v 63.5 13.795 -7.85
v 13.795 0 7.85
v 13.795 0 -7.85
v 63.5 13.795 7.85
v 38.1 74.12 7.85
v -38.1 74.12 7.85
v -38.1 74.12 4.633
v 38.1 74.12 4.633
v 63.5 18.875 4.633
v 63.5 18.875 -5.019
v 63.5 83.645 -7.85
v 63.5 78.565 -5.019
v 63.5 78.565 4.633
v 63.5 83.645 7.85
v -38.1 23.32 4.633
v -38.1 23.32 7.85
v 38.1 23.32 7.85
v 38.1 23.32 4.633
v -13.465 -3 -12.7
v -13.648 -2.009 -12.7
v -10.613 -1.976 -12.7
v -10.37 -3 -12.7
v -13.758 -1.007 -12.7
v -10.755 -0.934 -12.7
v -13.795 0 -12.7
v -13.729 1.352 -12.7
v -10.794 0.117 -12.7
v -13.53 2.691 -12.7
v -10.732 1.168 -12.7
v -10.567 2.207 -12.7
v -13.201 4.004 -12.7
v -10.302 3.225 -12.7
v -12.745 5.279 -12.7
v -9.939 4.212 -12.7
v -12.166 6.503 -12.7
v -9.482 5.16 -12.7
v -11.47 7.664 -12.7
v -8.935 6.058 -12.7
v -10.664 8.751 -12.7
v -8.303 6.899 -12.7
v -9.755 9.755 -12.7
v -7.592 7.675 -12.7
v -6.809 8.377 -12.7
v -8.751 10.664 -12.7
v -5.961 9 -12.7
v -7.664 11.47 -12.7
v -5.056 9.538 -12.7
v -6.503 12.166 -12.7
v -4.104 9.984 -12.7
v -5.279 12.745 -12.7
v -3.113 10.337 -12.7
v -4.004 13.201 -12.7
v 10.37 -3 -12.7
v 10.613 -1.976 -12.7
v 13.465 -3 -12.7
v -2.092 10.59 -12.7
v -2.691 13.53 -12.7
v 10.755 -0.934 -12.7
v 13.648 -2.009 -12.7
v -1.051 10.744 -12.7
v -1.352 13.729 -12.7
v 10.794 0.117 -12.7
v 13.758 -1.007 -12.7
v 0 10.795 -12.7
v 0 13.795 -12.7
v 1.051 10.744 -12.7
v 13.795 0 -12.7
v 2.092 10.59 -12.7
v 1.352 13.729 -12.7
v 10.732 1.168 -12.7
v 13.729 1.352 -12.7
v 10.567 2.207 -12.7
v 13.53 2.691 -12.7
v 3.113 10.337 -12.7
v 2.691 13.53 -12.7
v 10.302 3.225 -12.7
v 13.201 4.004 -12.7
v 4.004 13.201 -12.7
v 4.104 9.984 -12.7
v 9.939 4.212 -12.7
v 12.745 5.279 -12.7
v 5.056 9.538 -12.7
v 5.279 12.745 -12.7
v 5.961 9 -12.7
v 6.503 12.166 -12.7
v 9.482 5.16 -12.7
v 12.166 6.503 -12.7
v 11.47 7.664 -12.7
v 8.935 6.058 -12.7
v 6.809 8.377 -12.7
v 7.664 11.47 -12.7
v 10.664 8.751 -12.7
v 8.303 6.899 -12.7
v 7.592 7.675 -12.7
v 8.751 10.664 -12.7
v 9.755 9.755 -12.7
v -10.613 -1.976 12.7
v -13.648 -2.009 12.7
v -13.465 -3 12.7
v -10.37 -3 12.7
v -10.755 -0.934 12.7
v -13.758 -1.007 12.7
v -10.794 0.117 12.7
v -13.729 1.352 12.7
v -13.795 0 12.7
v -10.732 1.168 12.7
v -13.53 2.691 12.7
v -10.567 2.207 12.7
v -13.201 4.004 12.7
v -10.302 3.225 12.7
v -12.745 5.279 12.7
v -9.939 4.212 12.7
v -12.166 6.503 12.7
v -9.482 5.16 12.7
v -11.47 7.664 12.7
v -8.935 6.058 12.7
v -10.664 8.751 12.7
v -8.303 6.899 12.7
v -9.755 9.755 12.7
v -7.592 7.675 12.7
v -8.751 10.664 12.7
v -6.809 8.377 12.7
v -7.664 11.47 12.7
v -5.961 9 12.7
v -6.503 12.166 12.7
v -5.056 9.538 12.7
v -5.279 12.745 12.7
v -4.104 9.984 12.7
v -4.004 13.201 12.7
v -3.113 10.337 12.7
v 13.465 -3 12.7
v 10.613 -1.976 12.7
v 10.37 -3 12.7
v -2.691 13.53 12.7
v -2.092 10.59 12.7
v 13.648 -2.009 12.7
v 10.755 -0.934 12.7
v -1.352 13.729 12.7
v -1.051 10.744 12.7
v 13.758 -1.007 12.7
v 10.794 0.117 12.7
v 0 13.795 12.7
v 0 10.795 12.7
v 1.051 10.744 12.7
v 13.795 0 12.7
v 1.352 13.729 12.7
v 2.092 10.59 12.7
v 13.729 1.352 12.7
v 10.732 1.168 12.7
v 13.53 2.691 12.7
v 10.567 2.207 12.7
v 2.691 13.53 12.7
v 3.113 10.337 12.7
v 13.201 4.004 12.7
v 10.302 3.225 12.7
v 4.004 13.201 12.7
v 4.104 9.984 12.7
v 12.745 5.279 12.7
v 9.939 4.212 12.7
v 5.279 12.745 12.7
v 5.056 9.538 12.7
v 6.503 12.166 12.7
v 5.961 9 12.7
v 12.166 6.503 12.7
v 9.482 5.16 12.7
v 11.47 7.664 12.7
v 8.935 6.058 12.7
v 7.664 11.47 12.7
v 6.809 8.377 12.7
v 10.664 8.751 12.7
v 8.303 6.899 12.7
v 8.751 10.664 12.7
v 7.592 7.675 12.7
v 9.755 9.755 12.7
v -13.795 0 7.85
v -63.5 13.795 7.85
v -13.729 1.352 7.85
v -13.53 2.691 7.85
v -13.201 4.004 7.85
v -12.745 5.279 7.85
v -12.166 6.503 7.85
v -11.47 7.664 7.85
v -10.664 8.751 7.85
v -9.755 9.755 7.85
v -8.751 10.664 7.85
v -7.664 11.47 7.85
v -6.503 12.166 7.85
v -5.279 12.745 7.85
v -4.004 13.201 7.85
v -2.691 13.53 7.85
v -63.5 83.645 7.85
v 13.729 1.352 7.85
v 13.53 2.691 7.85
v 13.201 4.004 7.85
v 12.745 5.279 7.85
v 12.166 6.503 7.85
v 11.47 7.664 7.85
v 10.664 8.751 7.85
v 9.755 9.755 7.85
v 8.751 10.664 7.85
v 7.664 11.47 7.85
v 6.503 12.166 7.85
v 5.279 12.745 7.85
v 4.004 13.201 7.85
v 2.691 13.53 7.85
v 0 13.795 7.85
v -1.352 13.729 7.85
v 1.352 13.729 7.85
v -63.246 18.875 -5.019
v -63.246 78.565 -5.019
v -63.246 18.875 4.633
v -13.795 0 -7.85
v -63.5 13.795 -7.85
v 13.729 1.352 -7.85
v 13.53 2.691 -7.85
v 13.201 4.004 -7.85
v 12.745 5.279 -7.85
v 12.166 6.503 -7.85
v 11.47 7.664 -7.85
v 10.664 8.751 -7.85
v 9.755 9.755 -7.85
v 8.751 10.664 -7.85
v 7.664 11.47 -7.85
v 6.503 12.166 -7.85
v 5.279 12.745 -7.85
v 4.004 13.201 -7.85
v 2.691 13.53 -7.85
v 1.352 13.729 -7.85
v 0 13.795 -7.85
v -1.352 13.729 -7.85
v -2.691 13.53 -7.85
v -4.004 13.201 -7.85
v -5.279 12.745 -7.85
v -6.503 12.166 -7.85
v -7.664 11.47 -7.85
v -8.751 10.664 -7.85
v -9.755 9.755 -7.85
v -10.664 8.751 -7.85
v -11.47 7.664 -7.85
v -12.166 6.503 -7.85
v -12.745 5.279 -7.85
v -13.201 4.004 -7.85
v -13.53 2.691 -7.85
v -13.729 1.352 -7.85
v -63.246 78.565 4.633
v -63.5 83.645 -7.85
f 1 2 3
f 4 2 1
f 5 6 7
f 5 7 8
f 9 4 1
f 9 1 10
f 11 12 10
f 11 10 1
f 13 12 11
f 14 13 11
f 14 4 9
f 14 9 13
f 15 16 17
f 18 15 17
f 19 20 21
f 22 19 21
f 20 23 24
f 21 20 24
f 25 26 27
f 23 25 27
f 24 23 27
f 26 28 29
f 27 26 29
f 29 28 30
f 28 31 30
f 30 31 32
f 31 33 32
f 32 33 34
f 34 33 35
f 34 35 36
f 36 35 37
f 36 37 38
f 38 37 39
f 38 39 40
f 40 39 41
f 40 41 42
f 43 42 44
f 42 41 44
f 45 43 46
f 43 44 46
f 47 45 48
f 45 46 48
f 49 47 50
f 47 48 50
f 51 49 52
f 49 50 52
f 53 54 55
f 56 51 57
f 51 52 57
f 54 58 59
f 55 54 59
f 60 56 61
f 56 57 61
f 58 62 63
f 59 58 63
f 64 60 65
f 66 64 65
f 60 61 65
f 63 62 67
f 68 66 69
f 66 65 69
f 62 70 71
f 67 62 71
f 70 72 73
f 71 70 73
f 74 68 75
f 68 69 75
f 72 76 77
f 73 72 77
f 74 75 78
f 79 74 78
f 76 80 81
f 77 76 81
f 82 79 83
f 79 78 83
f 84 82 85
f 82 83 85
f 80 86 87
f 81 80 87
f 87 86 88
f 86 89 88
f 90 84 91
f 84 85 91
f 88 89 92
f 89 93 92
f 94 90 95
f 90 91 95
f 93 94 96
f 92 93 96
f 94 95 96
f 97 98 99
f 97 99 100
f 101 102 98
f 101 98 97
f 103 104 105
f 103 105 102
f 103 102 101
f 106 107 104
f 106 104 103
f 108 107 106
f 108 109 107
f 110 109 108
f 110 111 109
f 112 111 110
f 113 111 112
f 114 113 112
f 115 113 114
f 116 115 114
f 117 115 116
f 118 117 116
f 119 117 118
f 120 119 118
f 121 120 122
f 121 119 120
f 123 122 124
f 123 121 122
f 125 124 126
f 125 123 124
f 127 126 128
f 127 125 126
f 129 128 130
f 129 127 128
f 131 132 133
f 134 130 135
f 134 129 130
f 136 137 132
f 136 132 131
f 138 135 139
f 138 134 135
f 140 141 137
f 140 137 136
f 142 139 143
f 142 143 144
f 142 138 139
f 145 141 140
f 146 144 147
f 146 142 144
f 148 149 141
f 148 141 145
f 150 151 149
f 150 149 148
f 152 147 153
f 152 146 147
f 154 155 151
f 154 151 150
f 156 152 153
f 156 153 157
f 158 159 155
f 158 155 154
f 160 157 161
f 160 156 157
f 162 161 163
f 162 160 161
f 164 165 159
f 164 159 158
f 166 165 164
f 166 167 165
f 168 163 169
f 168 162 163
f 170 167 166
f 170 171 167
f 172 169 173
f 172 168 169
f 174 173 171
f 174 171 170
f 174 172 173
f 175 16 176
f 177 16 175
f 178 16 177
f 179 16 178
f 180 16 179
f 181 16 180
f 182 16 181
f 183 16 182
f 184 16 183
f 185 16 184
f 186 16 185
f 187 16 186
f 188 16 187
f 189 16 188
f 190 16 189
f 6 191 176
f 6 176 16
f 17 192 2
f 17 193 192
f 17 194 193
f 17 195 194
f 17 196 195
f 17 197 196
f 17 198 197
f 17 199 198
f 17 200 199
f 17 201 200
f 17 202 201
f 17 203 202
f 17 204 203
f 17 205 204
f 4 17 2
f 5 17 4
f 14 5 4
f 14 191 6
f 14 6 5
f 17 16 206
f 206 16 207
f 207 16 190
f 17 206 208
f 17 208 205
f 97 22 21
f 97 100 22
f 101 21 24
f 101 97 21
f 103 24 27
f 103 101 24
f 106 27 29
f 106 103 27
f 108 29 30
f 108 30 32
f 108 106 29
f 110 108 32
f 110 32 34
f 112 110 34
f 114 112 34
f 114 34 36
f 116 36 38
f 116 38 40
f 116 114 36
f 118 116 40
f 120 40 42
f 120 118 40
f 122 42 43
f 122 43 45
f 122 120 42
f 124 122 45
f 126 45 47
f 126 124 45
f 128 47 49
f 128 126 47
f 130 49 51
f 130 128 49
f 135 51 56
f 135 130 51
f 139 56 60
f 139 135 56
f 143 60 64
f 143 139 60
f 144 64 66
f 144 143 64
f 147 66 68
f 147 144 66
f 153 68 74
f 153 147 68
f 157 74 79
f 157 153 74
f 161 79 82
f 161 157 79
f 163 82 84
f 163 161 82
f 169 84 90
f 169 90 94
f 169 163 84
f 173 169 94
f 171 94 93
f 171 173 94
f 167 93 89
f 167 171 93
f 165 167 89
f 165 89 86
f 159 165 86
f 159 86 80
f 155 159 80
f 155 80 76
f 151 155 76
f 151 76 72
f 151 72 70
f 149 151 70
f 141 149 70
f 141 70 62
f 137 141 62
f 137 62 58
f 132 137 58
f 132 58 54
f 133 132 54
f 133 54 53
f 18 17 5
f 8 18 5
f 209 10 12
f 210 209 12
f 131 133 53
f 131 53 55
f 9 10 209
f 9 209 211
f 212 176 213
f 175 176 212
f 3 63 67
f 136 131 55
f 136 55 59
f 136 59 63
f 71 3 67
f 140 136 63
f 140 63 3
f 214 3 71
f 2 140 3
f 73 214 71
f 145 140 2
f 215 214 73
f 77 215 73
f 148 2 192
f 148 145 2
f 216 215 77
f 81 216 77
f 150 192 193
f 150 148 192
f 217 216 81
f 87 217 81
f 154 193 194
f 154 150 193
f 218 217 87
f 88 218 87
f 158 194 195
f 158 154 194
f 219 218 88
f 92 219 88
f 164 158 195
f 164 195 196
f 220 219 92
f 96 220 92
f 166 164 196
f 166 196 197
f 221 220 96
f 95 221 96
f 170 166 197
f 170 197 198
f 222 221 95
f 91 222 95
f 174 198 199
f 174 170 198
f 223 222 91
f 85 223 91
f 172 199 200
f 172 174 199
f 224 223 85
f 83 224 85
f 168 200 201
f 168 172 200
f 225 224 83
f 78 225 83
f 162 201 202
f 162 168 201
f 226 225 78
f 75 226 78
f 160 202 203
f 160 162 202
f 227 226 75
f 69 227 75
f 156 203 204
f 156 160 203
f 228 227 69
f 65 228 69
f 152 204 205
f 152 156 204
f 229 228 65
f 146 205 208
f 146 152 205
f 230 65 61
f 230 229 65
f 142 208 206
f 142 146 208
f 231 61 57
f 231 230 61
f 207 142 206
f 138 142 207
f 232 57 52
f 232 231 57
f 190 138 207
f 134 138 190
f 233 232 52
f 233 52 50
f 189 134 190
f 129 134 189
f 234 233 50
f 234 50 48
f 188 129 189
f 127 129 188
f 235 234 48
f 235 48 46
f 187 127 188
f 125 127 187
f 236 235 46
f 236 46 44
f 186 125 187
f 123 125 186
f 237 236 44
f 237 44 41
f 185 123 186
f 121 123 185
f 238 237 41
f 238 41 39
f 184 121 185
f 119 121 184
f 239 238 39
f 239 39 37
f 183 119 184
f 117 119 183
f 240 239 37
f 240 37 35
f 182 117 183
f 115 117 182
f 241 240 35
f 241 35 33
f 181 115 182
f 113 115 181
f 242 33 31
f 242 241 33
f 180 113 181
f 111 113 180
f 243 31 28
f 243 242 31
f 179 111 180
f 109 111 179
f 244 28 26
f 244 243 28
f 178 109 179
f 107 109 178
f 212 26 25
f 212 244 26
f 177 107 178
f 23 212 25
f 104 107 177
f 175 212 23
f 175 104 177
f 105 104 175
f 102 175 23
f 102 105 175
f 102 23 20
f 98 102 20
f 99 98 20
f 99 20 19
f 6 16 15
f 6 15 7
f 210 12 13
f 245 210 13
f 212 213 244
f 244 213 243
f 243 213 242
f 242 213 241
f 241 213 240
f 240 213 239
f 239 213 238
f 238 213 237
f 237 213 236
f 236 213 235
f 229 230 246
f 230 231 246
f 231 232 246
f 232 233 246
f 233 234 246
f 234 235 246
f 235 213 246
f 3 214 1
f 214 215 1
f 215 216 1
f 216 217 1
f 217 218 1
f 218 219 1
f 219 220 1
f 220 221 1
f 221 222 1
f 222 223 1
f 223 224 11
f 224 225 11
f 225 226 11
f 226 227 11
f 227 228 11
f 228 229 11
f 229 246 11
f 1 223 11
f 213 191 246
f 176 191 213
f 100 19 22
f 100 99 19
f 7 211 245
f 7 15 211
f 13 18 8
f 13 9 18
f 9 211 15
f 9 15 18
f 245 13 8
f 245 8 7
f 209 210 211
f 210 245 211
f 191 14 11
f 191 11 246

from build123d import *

# Parameters (mm, degrees)
F1_DEPTH  = 12.7
F3_DEPTH  = 7.85
F4_W      = 59.69
F4_H      = 9.652
F5_DEPTH  = 127.001
F6_W      = 76.2
F6_H      = 50.8
F7_DEPTH  = 5.08
F9_W      = 62.4130927026
F9_H      = 11.1426808871
F10_DEPTH = 0.254


with BuildPart() as f1:
    # F0 (on Top) → F1 (new body, symmetric)
    with BuildSketch(Plane.XY):
        with BuildLine():
            ThreePointArc((-10.3697649443, -3), (0, 10.795), (10.3697649443, -3))
            Line((10.3697649443, -3), (13.4648440392, -3))
            ThreePointArc((13.4648440392, -3), (13.7122125954, -1.5090562414), (13.795, 0))
            ThreePointArc((13.795, 0), (0, 13.795), (-13.795, 0))
            ThreePointArc((-13.795, 0), (-13.7122125954, -1.5090562414), (-13.4648440392, -3))
            Line((-13.4648440392, -3), (-10.3697649443, -3))
        make_face()
    extrude(amount=F1_DEPTH, both=True)

    # F2 (on Top) → F3 (join, symmetric)
    with BuildSketch(Plane.XY):
        with BuildLine():
            Line((63.5, 13.794994), (63.5, 83.644994))
            Line((63.5, 83.644994), (-63.5, 83.644994))
            Line((-63.5, 83.644994), (-63.5, 13.794994))
            Line((-63.5, 13.794994), (-13.794994, 0))
            ThreePointArc((-13.794994, 0), (0, 13.794994), (13.794994, 0))
            Line((13.794994, 0), (63.5, 13.794994))
        make_face()
    extrude(amount=F3_DEPTH, both=True)

    # F4 (on face) → F5 (cut, through all)
    with BuildSketch(Plane.YZ.offset(63.5)):
        with Locations((48.719994, -0.1927575009)):
            Rectangle(F4_W, F4_H)
    extrude(amount=-F5_DEPTH, mode=Mode.SUBTRACT)

    # F6 (on face) → F7 (cut)
    with BuildSketch(Plane.XY.offset(7.85)):
        with Locations((0, 48.719994)):
            Rectangle(F6_W, F6_H)
    extrude(amount=-F7_DEPTH, mode=Mode.SUBTRACT)

    # F9 (on face) → F10 (join)
    with BuildSketch(Plane(origin=(-63.5, 0, 0), x_dir=(0, -1, 0), z_dir=(-1, 0, 0))):
        with Locations((-48.8958675414, -0.0143751968)):
            Rectangle(F9_W, F9_H)
    extrude(amount=-F10_DEPTH)


solid = f1.part
